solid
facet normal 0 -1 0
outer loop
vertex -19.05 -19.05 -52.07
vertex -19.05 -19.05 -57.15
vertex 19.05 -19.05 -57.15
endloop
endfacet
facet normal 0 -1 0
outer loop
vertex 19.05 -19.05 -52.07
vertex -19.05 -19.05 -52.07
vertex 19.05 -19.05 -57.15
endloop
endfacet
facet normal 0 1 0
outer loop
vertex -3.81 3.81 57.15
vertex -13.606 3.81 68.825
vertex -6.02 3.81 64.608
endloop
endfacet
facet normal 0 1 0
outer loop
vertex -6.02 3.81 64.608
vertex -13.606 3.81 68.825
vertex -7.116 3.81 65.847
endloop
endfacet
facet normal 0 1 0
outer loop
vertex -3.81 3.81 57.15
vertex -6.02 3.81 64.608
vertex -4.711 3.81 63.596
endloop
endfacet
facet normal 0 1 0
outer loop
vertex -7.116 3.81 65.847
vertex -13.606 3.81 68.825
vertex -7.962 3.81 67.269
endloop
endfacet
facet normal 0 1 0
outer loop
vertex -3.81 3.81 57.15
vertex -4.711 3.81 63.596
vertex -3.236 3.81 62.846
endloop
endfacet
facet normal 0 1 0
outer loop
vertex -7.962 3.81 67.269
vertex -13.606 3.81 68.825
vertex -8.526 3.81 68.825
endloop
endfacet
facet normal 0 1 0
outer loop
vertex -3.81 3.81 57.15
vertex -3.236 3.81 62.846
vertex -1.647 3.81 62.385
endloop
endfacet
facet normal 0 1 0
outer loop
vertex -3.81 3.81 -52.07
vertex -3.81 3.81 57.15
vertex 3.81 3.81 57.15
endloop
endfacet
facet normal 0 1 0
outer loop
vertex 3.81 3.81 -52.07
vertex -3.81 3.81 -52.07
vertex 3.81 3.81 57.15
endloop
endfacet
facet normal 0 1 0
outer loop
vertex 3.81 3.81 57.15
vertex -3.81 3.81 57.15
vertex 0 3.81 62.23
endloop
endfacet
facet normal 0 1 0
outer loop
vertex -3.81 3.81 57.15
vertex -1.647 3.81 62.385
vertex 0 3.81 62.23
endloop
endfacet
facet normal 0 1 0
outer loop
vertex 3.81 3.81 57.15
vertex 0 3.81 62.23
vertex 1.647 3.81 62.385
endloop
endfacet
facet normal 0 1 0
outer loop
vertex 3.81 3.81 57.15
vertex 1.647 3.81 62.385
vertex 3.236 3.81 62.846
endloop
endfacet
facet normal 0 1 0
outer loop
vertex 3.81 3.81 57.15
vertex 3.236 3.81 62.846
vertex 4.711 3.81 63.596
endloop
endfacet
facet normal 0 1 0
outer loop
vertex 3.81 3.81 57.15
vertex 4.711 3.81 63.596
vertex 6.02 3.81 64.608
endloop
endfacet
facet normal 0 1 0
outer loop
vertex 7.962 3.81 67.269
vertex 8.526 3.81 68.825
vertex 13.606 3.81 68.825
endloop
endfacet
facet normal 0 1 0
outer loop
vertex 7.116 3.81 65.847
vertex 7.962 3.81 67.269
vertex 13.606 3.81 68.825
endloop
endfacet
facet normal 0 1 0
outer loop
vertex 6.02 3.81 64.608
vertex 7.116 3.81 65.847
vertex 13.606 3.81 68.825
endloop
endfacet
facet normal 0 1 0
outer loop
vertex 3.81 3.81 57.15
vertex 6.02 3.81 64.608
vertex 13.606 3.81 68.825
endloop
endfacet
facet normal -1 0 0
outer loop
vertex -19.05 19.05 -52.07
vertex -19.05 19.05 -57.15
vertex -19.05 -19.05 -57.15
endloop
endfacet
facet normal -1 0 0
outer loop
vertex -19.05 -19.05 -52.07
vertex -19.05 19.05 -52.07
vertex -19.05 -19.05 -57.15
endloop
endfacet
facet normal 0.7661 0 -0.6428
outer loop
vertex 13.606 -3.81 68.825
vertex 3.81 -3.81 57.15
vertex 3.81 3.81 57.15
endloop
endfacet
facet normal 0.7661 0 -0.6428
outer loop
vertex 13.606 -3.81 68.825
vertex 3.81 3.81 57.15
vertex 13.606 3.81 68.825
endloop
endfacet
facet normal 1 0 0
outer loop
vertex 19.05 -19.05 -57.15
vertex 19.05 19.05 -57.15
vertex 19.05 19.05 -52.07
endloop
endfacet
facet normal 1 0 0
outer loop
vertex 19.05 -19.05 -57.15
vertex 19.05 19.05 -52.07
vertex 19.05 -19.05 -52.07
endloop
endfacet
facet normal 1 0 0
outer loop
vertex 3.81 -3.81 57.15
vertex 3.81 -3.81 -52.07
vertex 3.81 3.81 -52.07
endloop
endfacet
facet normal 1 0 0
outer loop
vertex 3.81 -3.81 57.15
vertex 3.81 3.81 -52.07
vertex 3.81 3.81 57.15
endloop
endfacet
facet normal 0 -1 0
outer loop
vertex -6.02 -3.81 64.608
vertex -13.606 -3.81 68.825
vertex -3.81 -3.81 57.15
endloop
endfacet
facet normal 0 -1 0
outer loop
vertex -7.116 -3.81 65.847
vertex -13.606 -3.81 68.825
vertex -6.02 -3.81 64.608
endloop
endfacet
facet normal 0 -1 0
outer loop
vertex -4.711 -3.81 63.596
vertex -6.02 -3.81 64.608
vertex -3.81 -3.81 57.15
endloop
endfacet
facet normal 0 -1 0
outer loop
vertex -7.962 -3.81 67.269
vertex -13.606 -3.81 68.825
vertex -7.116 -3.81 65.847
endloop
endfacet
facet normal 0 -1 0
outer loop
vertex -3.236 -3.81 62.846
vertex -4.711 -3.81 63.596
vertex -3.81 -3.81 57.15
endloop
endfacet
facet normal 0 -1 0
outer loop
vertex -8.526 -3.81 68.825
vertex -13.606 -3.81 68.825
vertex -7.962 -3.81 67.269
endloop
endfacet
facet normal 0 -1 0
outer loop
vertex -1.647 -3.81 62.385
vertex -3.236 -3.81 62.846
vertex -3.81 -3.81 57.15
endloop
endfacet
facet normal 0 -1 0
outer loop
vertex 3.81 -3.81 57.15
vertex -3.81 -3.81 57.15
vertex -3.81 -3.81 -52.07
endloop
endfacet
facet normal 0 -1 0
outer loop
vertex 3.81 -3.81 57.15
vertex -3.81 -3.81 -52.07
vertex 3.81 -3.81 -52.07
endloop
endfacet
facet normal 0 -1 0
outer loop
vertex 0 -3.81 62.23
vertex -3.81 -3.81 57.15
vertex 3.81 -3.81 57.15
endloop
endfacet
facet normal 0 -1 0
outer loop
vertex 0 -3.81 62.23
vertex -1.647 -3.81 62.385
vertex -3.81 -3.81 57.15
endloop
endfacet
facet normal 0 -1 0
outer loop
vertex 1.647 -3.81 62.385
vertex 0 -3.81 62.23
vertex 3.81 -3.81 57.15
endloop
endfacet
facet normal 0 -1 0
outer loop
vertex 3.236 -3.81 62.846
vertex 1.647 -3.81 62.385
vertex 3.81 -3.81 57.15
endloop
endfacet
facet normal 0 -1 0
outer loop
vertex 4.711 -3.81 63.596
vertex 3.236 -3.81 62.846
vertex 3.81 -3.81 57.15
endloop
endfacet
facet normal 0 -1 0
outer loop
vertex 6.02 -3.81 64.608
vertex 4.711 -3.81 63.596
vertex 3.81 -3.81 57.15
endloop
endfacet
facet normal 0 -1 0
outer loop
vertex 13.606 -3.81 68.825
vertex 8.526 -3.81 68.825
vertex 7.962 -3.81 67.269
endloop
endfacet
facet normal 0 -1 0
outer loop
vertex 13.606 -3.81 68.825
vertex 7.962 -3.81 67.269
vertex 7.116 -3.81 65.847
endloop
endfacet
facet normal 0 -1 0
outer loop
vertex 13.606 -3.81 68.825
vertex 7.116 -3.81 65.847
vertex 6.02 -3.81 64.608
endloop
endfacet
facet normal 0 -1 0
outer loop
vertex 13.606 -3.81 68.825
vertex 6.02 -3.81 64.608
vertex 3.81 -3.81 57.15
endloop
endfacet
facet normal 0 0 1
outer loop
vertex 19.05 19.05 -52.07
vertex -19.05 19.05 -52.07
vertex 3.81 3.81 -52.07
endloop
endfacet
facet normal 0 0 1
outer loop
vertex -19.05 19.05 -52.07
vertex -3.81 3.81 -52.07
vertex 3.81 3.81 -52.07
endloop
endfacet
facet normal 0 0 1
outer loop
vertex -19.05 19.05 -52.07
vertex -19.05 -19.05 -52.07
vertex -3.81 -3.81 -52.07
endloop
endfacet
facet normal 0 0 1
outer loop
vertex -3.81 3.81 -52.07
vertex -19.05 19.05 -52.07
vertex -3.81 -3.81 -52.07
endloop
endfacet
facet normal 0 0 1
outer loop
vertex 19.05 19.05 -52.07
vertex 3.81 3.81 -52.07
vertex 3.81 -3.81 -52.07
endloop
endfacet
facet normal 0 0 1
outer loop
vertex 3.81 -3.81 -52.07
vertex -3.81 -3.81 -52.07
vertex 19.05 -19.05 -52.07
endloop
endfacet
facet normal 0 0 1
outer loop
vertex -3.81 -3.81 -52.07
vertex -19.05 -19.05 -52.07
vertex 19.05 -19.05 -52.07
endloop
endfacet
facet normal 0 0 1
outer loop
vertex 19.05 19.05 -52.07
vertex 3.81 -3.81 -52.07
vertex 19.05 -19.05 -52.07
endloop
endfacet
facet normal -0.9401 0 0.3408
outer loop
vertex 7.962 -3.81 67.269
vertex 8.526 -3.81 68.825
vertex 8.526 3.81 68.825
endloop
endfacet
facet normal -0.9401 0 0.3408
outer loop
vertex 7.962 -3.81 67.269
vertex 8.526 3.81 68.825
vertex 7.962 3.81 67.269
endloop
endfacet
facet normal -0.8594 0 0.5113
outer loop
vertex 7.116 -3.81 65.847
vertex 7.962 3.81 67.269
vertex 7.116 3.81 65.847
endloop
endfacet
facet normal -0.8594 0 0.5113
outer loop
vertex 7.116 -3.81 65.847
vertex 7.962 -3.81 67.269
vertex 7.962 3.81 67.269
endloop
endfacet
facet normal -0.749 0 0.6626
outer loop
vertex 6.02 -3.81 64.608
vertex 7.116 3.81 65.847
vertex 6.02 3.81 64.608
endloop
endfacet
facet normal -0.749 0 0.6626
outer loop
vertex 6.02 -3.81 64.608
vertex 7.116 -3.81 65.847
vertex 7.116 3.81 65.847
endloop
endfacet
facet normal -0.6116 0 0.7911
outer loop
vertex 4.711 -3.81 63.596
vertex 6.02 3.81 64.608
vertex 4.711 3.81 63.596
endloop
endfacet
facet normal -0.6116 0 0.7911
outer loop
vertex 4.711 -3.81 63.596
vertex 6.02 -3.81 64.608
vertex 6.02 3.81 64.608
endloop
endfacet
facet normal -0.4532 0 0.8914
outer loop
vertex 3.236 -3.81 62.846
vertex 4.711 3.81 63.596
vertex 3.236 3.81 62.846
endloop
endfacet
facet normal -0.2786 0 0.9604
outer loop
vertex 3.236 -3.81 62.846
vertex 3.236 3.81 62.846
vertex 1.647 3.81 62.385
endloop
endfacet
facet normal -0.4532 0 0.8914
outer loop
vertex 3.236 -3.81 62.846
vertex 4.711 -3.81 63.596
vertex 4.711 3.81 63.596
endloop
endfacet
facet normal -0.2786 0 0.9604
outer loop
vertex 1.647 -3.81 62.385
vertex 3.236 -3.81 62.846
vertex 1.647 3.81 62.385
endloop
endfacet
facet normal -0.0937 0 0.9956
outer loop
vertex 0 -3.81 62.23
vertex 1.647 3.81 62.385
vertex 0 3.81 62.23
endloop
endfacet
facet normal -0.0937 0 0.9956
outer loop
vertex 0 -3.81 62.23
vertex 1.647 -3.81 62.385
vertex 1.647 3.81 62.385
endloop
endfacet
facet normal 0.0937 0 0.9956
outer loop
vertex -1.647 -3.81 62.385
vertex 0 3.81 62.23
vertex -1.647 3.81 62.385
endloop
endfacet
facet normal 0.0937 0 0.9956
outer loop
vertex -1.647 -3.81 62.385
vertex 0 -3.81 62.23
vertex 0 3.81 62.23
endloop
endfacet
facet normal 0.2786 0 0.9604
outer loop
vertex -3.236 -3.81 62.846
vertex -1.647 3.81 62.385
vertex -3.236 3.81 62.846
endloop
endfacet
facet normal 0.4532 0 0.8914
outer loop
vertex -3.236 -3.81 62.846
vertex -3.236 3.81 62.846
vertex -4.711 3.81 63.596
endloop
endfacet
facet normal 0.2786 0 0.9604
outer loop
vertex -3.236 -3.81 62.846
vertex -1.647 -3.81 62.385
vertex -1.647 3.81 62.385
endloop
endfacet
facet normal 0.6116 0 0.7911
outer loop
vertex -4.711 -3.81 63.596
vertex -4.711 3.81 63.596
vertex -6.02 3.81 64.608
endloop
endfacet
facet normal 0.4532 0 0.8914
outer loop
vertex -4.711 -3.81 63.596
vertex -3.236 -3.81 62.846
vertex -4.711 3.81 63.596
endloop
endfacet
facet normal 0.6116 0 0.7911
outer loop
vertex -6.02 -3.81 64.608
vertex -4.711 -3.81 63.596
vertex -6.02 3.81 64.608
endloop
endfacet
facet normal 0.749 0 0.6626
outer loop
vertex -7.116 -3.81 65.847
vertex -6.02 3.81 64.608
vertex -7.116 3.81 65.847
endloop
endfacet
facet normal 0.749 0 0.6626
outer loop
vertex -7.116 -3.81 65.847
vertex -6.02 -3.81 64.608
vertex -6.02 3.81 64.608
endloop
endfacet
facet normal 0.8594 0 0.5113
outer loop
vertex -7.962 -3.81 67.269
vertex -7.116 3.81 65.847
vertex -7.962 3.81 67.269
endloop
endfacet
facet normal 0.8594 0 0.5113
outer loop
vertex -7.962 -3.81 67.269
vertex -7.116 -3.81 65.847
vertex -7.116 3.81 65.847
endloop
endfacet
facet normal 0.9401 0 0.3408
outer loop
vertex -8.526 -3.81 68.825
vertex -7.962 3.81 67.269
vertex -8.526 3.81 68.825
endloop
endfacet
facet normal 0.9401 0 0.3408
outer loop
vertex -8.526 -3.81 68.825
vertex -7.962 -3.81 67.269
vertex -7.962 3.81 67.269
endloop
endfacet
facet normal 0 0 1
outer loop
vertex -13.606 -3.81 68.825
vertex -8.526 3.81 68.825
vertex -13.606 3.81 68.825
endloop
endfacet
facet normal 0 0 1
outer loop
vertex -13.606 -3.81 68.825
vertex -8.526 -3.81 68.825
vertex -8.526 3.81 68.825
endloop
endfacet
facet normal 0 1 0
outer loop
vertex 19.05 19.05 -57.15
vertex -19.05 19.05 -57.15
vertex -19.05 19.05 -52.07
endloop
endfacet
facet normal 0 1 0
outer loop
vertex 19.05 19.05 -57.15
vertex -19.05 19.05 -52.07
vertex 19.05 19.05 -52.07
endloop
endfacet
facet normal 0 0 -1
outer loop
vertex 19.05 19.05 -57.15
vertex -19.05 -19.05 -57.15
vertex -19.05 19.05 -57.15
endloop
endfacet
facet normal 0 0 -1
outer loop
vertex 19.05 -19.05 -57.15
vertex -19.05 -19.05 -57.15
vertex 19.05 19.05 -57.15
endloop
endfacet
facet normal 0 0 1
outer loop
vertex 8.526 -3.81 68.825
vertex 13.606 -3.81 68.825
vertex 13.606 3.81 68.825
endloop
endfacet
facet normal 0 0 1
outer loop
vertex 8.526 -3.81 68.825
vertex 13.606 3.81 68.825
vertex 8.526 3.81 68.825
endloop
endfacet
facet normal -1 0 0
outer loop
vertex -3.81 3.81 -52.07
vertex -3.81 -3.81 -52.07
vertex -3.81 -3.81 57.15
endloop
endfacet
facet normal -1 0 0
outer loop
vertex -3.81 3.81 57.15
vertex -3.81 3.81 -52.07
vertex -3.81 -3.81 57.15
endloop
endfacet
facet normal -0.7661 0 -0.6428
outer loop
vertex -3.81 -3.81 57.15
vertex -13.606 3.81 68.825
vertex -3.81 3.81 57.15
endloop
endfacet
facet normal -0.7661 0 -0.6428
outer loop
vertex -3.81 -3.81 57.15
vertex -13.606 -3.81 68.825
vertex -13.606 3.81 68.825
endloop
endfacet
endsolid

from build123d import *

# Parameters (mm, degrees)
F0_W     = 7.62
F0_H     = 114.3
F1_DEPTH = 3.81
F2_W     = 38.1
F2_H     = 38.1
F2_W_2   = 7.62
F2_H_2   = 7.62
F3_DEPTH = 5.08


with BuildPart() as f1:
    # F0 (on Front) → F1 (new body, symmetric)
    with BuildSketch(Plane.XZ):
        Rectangle(F0_W, F0_H)
        with BuildLine():
            Line((-3.81, 57.15), (3.81, 57.15))
            Line((3.81, 57.15), (13.606083, 68.824517))
            Line((13.606083, 68.824517), (8.526083, 68.824517))
            ThreePointArc((8.526083, 68.824517), (0, 62.23), (-8.526083, 68.824517))
            Line((-8.526083, 68.824517), (-13.606083, 68.824517))
            Line((-13.606083, 68.824517), (-3.81, 57.15))
        make_face()
    extrude(amount=F1_DEPTH, both=True)

    # F2 (on face) → F3 (join)
    with BuildSketch(Plane(origin=(0, 0, -57.15), x_dir=(1, 0, 0), z_dir=(0, 0, -1))):
        Rectangle(F2_W, F2_H)
        Rectangle(F2_W_2, F2_H_2, mode=Mode.SUBTRACT)
    extrude(amount=-F3_DEPTH)


solid = f1.part
